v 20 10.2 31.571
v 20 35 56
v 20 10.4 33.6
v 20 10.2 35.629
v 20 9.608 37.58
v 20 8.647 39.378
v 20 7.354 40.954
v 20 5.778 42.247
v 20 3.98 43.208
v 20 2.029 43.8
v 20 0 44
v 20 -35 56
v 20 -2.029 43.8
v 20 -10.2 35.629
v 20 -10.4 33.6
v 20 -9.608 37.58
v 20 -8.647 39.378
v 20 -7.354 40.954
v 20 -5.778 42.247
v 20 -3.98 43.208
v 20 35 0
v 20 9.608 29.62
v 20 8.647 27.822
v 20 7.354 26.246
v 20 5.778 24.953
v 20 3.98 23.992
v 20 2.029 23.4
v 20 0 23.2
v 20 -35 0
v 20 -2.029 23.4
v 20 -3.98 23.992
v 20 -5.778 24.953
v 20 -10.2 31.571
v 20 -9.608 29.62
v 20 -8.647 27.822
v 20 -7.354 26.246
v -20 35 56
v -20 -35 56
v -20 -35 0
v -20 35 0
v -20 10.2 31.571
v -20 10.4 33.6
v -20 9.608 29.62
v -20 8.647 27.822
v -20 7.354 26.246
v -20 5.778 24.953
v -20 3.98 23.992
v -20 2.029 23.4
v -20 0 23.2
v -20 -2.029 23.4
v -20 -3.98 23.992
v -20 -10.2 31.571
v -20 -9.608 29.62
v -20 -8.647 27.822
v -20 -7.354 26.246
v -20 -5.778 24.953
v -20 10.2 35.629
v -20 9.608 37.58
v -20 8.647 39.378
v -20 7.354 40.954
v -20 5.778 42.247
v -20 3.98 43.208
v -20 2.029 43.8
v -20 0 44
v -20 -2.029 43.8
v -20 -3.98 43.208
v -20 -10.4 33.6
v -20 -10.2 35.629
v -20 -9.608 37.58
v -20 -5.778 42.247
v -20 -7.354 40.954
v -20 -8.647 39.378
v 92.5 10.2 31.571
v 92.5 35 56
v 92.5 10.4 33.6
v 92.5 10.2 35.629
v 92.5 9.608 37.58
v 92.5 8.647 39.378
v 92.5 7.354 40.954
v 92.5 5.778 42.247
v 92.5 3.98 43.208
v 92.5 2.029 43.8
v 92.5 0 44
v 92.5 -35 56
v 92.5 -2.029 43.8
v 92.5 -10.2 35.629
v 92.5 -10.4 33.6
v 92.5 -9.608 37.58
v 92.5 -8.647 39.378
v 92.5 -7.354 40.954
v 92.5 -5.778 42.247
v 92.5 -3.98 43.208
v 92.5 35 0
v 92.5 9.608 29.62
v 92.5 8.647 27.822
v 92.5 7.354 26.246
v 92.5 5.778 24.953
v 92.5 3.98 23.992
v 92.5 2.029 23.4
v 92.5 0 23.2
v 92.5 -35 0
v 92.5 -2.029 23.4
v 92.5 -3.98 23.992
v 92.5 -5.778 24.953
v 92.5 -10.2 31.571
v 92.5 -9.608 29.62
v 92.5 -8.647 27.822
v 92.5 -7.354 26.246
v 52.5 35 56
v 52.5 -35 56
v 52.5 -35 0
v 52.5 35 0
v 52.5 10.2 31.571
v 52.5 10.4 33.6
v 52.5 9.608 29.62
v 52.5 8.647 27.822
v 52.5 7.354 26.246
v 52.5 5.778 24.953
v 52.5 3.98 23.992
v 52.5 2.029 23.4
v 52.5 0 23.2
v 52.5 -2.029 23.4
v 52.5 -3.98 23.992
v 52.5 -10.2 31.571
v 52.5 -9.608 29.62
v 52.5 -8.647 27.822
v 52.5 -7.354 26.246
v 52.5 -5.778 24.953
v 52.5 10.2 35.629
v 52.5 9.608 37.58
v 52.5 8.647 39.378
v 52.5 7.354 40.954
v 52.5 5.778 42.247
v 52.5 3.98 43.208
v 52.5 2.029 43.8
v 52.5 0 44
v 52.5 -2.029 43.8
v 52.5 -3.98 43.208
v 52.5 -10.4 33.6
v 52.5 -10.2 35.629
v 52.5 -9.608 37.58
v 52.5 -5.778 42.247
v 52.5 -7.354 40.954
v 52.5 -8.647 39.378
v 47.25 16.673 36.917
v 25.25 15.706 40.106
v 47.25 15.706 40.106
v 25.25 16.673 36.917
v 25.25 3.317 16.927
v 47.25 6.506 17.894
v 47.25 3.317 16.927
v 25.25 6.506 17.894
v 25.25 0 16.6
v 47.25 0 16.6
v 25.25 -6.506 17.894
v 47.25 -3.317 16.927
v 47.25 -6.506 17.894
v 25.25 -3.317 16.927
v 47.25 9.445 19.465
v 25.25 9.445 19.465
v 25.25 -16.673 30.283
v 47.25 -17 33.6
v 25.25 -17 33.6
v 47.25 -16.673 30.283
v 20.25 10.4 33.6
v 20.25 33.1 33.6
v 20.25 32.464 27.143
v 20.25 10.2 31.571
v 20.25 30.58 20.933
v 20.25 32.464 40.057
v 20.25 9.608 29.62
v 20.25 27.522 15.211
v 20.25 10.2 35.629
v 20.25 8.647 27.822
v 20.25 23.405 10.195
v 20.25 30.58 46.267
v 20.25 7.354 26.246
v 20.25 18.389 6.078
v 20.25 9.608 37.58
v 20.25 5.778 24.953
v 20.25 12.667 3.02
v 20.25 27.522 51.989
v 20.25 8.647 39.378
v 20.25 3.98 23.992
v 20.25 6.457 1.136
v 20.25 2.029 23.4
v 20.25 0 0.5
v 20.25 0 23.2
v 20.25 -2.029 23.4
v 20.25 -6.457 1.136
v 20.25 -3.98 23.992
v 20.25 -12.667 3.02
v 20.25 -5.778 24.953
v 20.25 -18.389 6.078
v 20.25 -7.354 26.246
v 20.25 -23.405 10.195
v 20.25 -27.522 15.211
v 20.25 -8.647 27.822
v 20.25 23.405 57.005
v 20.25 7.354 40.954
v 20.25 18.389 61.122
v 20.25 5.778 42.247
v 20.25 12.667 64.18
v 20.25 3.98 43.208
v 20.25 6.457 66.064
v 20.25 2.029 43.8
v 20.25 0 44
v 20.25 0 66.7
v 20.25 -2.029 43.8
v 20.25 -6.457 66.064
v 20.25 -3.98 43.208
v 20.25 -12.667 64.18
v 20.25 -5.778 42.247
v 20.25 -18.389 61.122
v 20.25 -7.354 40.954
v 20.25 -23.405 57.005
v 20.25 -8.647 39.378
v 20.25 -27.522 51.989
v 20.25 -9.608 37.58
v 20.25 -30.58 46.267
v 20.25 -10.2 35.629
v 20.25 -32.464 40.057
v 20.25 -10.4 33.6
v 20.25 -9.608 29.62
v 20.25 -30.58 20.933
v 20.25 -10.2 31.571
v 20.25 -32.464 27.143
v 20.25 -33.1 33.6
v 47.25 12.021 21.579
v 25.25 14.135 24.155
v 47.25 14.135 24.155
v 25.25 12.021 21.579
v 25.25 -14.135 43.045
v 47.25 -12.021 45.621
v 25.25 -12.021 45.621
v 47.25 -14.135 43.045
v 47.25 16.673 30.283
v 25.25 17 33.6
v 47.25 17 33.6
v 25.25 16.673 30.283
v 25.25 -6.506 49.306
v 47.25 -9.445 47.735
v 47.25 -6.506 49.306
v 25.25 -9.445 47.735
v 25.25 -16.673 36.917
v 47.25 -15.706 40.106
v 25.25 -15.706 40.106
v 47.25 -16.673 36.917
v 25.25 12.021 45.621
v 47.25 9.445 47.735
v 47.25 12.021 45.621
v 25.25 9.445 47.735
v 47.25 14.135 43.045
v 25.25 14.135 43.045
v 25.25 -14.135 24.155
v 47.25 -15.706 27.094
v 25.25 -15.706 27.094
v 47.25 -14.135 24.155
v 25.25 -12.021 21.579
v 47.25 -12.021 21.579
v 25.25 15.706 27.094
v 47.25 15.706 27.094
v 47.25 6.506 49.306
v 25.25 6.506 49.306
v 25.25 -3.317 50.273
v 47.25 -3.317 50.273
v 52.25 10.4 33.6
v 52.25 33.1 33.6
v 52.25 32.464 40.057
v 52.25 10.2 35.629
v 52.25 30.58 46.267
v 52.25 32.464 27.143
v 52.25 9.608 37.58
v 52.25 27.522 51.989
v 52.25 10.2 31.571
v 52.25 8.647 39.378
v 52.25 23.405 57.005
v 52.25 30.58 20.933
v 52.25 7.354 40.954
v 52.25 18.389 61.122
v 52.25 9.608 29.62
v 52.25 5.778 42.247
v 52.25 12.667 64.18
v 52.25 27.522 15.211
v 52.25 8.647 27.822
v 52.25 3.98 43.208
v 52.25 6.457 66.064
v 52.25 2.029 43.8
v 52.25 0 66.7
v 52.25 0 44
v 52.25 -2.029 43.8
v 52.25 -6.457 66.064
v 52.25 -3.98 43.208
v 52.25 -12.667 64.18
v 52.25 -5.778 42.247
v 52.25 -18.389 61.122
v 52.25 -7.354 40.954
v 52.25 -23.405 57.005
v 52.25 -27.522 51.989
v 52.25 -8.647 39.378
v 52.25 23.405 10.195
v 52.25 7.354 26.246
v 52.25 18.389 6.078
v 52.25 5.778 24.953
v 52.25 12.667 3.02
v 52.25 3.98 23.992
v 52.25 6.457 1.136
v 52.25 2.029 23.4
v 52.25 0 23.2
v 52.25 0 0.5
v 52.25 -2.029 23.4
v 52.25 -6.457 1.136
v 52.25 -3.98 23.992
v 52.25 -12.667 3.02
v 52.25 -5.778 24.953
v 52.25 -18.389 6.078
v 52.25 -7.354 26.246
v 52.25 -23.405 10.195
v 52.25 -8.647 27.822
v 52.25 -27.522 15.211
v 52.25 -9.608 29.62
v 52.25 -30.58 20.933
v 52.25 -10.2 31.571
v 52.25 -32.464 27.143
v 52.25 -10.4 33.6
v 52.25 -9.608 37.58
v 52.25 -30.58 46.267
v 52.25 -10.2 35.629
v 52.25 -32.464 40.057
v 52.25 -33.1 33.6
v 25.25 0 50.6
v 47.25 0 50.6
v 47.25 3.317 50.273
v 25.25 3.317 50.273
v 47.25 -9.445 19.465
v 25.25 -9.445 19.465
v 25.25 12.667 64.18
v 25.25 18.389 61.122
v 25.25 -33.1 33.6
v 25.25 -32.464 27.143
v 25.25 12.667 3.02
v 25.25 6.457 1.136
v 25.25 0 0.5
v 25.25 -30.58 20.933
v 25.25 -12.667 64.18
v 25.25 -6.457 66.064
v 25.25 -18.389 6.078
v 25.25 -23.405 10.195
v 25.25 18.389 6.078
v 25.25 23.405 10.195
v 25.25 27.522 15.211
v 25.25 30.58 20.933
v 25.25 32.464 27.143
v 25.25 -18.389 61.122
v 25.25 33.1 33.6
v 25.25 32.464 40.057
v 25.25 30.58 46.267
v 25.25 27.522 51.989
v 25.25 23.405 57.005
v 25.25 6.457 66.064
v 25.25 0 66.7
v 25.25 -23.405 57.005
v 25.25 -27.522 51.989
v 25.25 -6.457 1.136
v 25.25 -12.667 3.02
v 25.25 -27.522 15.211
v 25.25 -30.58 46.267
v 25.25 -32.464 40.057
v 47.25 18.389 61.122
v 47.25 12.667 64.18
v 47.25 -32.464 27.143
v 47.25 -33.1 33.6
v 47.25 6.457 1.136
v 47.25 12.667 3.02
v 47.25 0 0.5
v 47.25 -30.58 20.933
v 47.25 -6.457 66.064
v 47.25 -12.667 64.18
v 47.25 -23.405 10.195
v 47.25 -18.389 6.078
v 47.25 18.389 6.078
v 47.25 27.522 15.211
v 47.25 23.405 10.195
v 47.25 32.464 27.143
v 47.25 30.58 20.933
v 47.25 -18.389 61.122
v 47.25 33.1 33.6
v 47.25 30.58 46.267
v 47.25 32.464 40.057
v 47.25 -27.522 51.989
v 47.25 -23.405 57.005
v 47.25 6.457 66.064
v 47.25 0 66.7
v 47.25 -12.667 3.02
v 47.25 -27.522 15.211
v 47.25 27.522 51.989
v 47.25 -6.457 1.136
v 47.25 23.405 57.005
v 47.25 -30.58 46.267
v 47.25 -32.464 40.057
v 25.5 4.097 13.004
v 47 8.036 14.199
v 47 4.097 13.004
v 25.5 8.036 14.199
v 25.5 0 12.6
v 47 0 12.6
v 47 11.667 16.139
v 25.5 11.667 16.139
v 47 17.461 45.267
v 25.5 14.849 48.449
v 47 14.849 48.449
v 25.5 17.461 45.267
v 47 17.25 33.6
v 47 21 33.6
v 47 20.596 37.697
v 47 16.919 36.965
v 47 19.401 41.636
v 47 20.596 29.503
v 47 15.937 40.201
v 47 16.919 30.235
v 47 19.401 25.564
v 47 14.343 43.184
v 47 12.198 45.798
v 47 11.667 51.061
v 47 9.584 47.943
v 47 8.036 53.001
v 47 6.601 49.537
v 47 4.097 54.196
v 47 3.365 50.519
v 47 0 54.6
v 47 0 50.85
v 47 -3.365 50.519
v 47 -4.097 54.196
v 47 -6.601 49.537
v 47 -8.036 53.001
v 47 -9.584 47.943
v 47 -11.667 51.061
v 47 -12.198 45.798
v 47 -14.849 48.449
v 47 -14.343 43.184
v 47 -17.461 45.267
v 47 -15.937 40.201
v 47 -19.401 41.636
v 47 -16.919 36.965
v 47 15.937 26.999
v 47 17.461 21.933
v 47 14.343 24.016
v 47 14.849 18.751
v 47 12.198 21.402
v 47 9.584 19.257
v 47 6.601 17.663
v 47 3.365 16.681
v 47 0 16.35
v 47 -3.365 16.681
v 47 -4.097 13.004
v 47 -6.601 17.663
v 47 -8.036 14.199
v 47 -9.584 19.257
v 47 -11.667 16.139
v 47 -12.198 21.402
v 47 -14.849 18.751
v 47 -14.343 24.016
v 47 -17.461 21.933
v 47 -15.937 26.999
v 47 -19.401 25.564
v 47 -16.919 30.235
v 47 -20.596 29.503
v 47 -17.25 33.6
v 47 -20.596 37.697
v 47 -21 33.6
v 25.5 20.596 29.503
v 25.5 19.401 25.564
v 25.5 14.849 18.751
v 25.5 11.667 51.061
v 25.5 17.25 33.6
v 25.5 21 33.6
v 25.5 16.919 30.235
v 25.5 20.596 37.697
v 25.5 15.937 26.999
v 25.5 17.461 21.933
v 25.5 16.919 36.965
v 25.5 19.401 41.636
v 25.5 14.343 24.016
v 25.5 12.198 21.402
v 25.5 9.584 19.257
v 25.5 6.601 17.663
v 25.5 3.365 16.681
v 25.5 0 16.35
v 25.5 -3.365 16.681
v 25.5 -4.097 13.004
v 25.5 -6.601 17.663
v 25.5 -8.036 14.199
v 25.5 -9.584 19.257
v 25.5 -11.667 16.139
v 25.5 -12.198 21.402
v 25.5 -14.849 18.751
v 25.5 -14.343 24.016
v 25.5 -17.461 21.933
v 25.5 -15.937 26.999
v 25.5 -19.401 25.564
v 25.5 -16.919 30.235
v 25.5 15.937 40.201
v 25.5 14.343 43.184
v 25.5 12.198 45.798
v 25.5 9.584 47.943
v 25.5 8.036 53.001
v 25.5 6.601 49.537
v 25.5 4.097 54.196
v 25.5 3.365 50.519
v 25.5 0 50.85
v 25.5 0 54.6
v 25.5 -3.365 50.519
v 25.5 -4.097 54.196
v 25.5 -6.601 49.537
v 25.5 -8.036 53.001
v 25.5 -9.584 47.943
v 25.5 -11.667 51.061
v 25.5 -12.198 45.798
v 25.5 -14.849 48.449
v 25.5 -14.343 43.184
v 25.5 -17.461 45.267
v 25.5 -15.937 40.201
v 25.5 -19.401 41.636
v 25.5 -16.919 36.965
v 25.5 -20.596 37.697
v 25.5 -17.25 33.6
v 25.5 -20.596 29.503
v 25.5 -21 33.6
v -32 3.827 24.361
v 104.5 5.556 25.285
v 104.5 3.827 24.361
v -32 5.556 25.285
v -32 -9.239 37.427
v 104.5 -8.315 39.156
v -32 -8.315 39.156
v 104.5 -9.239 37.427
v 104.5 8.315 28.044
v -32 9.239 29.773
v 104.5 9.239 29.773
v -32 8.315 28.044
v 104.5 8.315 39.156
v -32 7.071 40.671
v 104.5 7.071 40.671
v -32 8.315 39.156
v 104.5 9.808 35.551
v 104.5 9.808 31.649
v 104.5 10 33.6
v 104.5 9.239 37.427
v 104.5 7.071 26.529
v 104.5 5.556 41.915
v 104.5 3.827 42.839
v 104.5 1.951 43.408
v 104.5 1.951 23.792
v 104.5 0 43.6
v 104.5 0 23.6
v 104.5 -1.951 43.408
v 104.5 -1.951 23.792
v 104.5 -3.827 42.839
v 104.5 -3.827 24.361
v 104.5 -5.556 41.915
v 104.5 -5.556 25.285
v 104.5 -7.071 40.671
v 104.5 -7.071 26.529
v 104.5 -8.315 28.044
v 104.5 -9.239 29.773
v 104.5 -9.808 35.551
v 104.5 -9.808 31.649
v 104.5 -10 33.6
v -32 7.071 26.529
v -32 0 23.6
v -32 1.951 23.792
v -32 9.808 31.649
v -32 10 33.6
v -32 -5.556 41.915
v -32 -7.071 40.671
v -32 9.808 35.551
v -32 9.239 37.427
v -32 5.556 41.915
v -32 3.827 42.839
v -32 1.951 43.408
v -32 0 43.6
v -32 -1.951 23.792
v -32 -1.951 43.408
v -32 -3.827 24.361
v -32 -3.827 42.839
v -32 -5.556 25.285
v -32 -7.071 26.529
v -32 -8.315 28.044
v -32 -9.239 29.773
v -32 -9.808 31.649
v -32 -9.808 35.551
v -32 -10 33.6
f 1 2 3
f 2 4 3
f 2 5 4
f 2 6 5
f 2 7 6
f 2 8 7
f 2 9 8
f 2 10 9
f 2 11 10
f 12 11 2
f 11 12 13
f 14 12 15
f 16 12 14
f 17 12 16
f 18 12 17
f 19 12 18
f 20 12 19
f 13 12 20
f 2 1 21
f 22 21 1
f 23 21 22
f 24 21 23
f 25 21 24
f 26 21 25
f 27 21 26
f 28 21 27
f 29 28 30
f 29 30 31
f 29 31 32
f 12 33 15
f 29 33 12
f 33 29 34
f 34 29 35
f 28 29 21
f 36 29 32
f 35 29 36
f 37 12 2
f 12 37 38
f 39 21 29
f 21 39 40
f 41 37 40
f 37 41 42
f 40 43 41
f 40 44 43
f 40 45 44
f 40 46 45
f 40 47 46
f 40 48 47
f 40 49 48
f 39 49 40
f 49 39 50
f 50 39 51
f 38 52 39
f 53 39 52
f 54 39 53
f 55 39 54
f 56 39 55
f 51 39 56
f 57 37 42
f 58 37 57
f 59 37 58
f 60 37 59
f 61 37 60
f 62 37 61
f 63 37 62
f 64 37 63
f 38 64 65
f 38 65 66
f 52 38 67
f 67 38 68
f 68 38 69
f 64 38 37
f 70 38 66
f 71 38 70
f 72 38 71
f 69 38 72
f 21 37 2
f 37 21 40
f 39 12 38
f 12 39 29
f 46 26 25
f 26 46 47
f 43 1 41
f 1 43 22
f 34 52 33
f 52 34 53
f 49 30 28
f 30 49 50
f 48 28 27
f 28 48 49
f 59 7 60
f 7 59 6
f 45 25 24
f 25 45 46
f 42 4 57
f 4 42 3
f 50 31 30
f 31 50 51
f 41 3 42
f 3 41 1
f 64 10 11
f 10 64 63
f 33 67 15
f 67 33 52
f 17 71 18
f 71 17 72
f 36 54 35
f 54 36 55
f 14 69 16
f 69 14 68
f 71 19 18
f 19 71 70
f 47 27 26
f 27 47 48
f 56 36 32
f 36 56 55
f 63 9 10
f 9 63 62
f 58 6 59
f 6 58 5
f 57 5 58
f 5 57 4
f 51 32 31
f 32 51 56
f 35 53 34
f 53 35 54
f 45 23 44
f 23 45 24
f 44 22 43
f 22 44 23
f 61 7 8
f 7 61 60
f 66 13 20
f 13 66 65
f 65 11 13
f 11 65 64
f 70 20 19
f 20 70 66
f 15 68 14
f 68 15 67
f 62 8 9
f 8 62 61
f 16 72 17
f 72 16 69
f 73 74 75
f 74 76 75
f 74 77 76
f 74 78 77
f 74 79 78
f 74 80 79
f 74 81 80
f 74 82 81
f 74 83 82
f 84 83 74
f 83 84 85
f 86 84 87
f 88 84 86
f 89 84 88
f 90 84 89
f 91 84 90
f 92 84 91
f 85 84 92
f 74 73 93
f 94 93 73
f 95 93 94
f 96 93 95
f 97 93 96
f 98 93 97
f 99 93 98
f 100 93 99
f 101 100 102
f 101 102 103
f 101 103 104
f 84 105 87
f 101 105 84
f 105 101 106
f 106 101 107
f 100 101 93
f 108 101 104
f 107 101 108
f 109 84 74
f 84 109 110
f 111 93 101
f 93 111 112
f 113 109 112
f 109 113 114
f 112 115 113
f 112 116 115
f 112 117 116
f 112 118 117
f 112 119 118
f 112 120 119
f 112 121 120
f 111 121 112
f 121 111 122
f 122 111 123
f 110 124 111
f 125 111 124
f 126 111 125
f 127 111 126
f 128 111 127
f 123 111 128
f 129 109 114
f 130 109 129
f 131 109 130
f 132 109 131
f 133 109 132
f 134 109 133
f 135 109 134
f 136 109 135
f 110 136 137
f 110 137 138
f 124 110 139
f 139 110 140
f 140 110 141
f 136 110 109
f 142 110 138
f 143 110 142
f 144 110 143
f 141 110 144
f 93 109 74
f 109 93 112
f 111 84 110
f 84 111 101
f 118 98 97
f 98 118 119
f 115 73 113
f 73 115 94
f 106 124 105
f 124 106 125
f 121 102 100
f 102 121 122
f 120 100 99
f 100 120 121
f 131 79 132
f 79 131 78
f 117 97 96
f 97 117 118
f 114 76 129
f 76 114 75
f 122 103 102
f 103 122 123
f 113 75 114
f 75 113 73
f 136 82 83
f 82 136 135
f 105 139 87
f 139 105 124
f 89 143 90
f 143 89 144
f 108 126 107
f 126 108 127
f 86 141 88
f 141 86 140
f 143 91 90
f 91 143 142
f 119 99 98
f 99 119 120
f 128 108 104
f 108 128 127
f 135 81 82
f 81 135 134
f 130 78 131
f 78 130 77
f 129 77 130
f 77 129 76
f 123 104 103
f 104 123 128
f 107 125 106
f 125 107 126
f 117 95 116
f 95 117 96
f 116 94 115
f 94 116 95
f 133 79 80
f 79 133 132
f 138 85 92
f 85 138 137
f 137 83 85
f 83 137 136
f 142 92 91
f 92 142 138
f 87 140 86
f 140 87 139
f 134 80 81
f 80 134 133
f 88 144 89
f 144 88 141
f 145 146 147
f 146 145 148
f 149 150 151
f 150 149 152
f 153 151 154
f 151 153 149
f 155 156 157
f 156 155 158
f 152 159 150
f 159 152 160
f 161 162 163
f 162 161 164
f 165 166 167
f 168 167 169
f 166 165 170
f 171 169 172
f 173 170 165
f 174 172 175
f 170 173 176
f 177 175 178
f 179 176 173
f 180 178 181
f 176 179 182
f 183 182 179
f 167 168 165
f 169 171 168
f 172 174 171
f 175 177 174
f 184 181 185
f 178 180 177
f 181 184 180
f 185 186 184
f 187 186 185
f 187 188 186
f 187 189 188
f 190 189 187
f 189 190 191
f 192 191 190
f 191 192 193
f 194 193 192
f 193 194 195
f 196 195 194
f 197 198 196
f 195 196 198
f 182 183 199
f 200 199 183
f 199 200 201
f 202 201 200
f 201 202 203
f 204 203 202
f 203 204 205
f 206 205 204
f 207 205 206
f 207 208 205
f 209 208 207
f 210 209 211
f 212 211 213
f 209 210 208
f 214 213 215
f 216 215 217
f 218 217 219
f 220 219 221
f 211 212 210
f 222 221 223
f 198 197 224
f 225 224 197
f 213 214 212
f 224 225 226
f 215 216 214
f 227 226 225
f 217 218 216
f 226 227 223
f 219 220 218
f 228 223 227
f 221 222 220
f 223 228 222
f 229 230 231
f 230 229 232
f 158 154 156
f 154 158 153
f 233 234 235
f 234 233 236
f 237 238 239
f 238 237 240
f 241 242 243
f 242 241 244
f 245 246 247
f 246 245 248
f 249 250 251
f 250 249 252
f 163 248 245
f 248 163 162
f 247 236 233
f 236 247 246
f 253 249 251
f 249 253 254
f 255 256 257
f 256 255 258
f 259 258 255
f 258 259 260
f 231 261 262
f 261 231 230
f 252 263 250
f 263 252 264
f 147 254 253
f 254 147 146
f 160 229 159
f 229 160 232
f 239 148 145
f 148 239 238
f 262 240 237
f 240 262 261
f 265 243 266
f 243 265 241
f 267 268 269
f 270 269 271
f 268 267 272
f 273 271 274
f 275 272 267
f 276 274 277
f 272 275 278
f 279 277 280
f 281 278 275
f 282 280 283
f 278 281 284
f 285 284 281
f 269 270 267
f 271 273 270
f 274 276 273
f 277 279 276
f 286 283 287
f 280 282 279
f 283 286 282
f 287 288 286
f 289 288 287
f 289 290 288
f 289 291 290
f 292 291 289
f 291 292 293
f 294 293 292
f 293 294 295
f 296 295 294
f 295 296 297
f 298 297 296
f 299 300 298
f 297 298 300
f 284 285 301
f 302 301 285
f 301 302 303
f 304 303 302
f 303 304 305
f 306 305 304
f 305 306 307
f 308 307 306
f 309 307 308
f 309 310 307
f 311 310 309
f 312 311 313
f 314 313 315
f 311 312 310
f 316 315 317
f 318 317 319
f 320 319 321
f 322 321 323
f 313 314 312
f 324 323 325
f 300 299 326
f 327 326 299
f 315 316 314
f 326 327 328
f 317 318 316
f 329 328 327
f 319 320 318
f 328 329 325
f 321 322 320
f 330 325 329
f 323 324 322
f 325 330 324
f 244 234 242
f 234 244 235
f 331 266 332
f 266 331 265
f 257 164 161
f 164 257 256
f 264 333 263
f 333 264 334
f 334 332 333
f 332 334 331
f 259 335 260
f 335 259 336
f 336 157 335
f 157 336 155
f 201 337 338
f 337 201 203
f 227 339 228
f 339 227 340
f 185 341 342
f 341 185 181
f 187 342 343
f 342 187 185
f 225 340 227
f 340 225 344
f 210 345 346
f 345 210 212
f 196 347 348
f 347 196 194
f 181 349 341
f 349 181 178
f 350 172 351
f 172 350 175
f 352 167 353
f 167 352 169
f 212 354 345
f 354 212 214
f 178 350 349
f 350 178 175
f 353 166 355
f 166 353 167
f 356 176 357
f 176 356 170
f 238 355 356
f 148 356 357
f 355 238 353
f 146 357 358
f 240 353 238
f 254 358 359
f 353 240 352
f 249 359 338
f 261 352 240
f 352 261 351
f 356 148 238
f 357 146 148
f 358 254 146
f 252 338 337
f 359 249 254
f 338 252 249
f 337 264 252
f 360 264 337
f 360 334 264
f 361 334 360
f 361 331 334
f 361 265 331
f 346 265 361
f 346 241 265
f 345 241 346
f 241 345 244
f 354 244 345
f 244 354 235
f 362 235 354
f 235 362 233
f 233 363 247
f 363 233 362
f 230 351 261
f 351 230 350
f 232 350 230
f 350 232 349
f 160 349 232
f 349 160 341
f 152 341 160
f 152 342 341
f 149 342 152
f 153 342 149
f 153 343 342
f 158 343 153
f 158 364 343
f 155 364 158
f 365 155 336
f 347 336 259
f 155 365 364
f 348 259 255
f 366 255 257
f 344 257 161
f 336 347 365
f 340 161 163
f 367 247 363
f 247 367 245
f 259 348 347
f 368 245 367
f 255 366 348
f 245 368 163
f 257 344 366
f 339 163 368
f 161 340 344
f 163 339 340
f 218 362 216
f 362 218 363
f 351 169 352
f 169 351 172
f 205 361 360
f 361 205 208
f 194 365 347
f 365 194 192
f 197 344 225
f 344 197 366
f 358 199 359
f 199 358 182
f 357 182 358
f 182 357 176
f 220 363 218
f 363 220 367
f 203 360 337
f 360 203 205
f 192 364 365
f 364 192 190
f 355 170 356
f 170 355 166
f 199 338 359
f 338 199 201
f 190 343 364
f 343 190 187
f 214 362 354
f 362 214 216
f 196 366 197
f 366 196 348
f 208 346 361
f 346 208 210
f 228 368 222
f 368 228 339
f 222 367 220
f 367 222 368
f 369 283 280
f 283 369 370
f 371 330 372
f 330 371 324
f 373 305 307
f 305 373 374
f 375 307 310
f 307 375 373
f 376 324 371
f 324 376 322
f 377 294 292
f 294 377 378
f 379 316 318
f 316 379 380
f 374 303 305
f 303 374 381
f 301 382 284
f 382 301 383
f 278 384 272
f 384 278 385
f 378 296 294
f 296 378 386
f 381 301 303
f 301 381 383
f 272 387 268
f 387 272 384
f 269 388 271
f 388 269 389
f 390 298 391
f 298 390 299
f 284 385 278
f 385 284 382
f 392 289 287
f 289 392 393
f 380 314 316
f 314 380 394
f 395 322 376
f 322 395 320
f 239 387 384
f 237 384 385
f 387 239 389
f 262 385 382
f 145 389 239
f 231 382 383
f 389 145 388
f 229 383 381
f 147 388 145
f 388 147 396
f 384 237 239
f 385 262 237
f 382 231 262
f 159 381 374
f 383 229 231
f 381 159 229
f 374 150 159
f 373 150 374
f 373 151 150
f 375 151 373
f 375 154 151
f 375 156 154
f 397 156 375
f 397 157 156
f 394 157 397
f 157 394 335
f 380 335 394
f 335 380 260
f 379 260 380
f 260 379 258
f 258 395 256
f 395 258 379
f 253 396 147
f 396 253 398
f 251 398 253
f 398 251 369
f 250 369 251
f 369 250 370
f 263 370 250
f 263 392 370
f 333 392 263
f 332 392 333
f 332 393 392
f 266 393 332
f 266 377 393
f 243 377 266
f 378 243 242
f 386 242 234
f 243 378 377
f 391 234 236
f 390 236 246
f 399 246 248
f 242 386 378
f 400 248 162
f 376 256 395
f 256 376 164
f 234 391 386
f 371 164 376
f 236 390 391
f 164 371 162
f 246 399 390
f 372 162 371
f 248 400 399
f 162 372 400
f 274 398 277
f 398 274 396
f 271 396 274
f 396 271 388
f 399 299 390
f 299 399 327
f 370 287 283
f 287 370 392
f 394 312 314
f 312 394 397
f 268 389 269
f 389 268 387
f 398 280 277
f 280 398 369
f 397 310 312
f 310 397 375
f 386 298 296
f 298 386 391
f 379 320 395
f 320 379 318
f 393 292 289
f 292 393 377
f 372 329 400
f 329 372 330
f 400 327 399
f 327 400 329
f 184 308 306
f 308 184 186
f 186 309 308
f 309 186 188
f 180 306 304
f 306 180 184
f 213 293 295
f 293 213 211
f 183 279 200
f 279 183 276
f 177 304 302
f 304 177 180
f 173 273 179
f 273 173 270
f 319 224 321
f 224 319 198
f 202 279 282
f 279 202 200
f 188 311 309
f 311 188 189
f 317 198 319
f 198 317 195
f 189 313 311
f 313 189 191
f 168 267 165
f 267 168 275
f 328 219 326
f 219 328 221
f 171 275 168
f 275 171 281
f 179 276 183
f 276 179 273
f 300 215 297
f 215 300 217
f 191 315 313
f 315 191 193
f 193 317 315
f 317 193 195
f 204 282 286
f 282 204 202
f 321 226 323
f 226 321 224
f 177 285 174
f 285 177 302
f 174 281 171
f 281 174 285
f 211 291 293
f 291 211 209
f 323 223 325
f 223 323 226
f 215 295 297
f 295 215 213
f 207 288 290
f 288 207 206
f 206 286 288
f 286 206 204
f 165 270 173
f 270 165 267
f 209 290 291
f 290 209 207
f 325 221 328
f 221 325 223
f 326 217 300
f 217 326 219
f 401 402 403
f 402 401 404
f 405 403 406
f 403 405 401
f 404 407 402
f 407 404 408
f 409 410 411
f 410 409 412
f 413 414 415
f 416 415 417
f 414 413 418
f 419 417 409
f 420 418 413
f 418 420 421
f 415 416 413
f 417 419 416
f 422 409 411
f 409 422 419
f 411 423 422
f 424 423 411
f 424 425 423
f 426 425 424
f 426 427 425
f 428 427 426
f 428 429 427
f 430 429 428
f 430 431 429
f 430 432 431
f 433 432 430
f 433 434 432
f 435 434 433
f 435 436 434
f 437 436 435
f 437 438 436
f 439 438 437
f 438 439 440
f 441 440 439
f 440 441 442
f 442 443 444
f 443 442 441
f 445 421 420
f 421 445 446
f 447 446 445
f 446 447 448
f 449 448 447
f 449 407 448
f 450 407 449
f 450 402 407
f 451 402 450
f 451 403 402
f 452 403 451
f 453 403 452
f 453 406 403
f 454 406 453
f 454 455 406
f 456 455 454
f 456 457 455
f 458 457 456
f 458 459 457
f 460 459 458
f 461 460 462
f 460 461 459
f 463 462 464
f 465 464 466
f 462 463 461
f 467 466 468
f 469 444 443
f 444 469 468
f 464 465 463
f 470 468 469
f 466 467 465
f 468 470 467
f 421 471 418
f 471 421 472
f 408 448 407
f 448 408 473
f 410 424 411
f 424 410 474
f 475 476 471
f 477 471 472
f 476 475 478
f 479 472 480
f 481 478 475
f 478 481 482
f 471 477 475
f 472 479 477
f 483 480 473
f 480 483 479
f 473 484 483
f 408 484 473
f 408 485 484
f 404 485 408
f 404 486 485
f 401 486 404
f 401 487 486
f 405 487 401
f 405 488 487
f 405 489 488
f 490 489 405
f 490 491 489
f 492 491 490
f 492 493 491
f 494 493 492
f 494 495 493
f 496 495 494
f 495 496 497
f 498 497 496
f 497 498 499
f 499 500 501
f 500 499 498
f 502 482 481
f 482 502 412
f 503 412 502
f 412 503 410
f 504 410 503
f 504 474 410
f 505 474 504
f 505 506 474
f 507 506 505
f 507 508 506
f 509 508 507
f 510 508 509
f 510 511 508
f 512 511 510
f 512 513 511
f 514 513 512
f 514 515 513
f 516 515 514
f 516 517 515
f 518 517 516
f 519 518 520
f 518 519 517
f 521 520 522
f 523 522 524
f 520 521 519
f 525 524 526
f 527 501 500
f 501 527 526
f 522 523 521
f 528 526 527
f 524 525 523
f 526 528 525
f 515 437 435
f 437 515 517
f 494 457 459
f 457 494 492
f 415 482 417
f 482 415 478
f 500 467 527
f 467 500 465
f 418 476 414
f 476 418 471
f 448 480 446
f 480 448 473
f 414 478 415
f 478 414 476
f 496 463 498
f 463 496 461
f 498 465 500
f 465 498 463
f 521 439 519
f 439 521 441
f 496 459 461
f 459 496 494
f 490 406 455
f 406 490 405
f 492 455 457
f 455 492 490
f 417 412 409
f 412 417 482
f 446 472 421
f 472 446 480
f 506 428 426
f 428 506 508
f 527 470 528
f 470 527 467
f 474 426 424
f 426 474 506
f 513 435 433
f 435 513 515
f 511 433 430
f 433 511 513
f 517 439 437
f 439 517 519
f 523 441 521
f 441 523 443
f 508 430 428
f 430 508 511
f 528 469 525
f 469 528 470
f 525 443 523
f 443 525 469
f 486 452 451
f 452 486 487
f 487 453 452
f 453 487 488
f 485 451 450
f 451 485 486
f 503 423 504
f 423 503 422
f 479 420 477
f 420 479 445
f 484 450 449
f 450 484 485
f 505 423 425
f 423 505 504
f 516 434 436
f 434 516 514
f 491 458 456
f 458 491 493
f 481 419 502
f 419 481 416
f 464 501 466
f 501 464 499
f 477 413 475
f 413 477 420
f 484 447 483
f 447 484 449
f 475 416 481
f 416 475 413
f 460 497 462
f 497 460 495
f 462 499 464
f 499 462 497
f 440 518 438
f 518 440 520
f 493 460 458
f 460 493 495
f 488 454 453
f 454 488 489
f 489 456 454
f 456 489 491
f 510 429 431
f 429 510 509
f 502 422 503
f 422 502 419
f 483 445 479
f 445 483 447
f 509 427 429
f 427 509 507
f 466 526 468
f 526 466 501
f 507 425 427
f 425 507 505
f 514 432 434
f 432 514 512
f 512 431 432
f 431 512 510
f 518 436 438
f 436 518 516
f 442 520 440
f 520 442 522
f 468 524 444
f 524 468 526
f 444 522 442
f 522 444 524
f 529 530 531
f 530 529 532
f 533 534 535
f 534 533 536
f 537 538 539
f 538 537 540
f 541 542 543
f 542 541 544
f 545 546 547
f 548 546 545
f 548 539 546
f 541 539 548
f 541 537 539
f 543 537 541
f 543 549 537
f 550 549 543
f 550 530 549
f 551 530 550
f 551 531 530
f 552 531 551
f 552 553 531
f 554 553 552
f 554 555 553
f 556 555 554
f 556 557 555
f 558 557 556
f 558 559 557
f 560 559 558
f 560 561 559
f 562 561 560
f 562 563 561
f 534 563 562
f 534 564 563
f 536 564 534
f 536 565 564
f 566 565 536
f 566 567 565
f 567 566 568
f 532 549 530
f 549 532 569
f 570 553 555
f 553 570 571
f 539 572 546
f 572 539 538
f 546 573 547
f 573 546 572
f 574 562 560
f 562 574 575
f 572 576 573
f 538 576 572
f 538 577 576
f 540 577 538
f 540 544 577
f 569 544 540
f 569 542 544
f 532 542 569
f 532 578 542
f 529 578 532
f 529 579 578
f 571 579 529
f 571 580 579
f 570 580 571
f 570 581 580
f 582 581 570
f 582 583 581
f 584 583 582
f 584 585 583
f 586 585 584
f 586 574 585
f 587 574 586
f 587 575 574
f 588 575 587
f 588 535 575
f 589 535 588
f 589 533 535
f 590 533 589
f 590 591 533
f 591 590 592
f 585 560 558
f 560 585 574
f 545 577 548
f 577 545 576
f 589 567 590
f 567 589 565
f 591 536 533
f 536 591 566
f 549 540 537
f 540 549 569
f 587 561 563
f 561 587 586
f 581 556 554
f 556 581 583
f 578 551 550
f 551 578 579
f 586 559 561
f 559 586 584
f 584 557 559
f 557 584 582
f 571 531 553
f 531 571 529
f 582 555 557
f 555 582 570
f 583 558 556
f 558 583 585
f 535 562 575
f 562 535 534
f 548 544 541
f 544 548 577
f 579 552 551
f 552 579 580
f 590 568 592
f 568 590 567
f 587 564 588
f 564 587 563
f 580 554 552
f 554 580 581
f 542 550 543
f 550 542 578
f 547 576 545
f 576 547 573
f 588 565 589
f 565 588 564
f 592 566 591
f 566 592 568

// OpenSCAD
$fn = 32;

// ------------------------------------------------------------------------
// Pulley assembly: d66.2 pulley with a belt, shaft d20
// Every part is its own module, assembly() places them once.
// ------------------------------------------------------------------------

// --- part 1 ---
module support1() {
  difference() {
    translate([-20, -35, 0]) cube([40, 70, 56]);
    translate([0, 0, 33.6]) rotate([0, 90, 0]) cylinder(h = 42, d = 20.8, center = true);
  }
}

// --- part 2 ---
module support2() {
  difference() {
    translate([-20, -35, 0]) cube([40, 70, 56]);
    translate([0, 0, 33.6]) rotate([0, 90, 0]) cylinder(h = 42, d = 20.8, center = true);
  }
}

// --- part 3 ---
module shaft() {
  translate([0, 0, -68.25]) cylinder(h = 136.5, d = 20);
}

// --- part 4 ---
module pulley() {
  difference() {
    union() {
      cylinder(h = 32, d = 34);
      cylinder(h = 5, d = 66.2);
      translate([0, 0, 27]) cylinder(h = 5, d = 66.2);
    }
    translate([0, 0, -1]) cylinder(h = 34, d = 20.8);
  }
}

// --- part 5 ---
module belt() {
  difference() {
      translate([0, 0, 0]) cylinder(h = 21.5, d = 42);
      translate([0, 0, -1]) cylinder(h = 23.5, d = 34.5);
    }
}

// --- assembly ---
module assembly() {
  translate([0, 0, 0]) rotate([0, 0, 0]) support1();
  translate([72.5, 0, 0]) rotate([0, 0, 0]) support2();
  translate([36.25, 0, 33.6]) rotate([0, 90, 0]) shaft();
  translate([20.25, 0, 33.6]) rotate([0, 90, 0]) pulley();
  translate([25.5, 0, 33.6]) rotate([0, 90, 0]) belt();
}

assembly();
